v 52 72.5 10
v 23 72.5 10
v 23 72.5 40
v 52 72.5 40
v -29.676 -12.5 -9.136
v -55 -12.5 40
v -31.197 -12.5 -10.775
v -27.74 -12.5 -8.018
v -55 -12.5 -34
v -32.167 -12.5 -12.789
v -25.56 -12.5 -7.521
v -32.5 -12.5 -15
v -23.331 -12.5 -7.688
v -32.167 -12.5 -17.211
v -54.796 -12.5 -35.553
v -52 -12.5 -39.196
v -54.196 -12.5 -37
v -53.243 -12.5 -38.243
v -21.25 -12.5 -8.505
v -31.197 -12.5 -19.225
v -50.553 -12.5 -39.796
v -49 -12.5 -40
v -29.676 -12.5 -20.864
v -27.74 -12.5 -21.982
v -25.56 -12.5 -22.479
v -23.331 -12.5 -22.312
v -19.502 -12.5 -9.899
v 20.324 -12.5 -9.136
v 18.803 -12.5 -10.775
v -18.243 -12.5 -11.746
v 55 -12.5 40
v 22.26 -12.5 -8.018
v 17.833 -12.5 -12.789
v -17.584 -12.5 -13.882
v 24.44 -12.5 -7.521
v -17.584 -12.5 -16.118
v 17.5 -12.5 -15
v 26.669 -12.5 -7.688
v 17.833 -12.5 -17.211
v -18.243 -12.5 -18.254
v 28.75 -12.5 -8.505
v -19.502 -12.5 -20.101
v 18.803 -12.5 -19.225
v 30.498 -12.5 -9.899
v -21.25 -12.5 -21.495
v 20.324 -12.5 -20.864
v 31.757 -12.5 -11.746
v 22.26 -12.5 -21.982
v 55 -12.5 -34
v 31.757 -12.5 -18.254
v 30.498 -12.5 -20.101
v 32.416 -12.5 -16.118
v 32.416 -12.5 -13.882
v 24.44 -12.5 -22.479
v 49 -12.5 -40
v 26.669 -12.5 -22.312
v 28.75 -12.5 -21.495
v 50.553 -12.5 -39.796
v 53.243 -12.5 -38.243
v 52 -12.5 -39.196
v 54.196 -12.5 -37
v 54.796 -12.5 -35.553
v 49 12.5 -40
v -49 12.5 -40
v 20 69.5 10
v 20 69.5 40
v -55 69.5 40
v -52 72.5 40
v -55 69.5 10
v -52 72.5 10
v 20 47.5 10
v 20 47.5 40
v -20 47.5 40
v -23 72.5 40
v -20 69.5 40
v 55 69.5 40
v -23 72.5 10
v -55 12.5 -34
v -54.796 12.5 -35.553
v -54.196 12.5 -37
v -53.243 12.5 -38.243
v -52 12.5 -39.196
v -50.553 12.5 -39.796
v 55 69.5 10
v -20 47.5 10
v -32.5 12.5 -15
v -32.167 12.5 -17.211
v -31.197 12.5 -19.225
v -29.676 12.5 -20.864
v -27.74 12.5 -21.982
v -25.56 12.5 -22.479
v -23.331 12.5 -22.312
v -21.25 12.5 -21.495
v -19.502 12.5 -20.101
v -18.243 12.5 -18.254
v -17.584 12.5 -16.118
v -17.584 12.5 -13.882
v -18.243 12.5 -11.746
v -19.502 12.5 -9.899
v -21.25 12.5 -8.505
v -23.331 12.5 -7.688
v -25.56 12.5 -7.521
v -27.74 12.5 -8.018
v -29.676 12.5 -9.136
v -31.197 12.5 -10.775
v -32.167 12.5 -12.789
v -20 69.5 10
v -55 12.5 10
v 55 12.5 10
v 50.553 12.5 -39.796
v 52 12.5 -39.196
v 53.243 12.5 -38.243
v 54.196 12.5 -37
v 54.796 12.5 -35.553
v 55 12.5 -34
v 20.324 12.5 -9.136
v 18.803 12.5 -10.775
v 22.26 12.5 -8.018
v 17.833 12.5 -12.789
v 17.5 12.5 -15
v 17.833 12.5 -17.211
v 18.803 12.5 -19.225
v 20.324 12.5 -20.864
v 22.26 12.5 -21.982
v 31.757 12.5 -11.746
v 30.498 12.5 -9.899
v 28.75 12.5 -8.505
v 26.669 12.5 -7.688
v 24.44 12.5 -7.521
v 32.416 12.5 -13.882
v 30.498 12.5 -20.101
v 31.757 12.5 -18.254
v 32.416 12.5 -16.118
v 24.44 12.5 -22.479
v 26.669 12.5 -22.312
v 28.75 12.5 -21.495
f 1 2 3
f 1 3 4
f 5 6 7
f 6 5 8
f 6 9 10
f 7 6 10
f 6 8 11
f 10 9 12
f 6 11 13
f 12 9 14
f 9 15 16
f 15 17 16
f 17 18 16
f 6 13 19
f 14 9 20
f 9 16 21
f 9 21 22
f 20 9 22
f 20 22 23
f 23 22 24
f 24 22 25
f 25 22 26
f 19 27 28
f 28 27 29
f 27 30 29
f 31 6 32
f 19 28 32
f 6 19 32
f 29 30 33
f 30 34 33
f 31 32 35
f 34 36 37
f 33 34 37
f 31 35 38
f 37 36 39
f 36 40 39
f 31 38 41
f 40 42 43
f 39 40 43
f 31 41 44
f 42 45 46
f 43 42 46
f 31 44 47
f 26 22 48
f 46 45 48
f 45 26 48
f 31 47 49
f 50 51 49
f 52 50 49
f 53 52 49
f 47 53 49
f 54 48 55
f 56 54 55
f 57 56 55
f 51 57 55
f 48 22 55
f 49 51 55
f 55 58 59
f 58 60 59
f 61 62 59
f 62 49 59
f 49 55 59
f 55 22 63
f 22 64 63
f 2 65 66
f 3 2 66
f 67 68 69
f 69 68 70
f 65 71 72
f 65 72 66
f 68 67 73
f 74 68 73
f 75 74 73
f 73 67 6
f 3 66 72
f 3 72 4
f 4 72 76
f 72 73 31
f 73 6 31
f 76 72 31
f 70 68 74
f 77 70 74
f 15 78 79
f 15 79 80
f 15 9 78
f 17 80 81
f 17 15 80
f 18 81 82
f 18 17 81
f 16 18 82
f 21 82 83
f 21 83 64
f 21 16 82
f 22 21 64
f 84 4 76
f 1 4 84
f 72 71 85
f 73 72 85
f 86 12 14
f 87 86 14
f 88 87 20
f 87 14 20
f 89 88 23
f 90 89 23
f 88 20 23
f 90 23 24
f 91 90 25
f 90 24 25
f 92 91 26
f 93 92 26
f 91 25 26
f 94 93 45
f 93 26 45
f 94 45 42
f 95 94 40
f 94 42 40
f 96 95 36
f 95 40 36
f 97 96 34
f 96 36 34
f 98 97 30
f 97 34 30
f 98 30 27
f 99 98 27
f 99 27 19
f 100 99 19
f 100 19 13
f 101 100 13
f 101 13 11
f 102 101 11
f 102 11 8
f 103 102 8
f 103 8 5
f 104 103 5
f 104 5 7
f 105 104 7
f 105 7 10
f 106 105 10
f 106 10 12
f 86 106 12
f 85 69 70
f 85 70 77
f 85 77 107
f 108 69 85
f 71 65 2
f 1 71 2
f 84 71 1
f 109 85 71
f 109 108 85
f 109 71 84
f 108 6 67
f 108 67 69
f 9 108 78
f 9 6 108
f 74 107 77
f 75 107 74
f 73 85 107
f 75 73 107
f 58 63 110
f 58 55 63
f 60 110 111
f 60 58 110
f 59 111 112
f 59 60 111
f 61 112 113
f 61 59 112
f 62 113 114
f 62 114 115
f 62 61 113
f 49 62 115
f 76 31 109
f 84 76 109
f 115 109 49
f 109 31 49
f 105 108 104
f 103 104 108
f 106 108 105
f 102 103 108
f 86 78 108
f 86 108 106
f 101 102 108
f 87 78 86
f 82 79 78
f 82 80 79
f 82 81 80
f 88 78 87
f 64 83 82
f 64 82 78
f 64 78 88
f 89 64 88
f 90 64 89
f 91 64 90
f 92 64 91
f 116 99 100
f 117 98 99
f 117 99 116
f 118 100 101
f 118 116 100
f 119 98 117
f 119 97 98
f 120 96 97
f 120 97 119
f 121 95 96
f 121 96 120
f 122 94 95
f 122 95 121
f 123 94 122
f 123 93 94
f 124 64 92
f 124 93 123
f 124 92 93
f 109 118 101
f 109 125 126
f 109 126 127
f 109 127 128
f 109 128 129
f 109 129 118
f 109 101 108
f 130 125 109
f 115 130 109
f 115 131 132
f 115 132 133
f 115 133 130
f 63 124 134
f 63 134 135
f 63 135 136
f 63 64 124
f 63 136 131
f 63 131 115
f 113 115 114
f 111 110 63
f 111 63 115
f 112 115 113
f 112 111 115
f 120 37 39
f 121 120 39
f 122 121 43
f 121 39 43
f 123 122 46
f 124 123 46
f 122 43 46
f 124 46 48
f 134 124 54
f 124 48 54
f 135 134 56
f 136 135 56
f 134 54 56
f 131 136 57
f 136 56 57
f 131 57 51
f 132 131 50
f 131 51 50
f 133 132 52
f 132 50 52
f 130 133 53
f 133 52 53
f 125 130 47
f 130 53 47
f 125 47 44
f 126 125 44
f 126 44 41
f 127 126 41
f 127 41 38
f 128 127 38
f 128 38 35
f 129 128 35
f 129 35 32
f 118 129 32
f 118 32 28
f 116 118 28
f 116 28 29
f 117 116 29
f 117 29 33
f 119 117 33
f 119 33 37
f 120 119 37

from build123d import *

# Parameters (mm, degrees)
SKETCH1_W             = 110
SKETCH1_H             = 80
BOSS_EXTRUDE1_DEPTH   = 12.5
SKETCH2_W             = 110
SKETCH2_H             = 30
BOSS_EXTRUDE2_DEPTH   = 60
SKETCH3_W             = 40
SKETCH3_H             = 25
CUT_EXTRUDE1_DEPTH    = 104.832798286
CHAMFER1_SIZE         = 3
FILLET1_R             = 6
F_1_0MM_DOWEL_HOLE1_D = 15


with BuildPart() as part:
    # Sketch1 → Boss-Extrude1 (new, symmetric)
    with BuildSketch(Plane(origin=(0, 0, 0), x_dir=(1, 0, 0), z_dir=(0, 1, 0))):
        Rectangle(SKETCH1_W, SKETCH1_H)
    extrude(amount=BOSS_EXTRUDE1_DEPTH, both=True)

    # Sketch2 → Boss-Extrude2 (add)
    with BuildSketch(Plane(origin=(0, 12.5, 0), x_dir=(1, 0, 0), z_dir=(0, 1, 0))):
        with Locations((0, -25)):
            Rectangle(SKETCH2_W, SKETCH2_H)
    extrude(amount=BOSS_EXTRUDE2_DEPTH)

    # Sketch3 → Cut-Extrude1 (cut, through all)
    with BuildSketch(Plane(origin=(0, 0, 10), x_dir=(-1, 0, 0), z_dir=(0, 0, -1))):
        with Locations((0, 60)):
            Rectangle(SKETCH3_W, SKETCH3_H)
    extrude(amount=-CUT_EXTRUDE1_DEPTH, mode=Mode.SUBTRACT)

    # Chamfer1
    chamfer1_edges = [part.edges().sort_by_distance(p)[0] for p in [
        (-55, 72.5, 25),
        (55, 72.5, 25),
        (20, 72.5, 25),
        (-20, 72.5, 25),
    ]]
    chamfer(chamfer1_edges, length=CHAMFER1_SIZE)

    # Fillet1
    fillet1_edges = [part.edges().sort_by_distance(p)[0] for p in [
        (-55, 0, -40),
        (55, 0, -40),
    ]]
    fillet(fillet1_edges, radius=FILLET1_R)

    # Ø1.0mm Dowel Hole1 (through all)
    with Locations(Plane(origin=(0, 12.5, 0), x_dir=(1, 0, 0), z_dir=(0, 1, 0))):
        with Locations((25, 15), (-25, 15)):
            Hole(F_1_0MM_DOWEL_HOLE1_D / 2)


solid = part.part
